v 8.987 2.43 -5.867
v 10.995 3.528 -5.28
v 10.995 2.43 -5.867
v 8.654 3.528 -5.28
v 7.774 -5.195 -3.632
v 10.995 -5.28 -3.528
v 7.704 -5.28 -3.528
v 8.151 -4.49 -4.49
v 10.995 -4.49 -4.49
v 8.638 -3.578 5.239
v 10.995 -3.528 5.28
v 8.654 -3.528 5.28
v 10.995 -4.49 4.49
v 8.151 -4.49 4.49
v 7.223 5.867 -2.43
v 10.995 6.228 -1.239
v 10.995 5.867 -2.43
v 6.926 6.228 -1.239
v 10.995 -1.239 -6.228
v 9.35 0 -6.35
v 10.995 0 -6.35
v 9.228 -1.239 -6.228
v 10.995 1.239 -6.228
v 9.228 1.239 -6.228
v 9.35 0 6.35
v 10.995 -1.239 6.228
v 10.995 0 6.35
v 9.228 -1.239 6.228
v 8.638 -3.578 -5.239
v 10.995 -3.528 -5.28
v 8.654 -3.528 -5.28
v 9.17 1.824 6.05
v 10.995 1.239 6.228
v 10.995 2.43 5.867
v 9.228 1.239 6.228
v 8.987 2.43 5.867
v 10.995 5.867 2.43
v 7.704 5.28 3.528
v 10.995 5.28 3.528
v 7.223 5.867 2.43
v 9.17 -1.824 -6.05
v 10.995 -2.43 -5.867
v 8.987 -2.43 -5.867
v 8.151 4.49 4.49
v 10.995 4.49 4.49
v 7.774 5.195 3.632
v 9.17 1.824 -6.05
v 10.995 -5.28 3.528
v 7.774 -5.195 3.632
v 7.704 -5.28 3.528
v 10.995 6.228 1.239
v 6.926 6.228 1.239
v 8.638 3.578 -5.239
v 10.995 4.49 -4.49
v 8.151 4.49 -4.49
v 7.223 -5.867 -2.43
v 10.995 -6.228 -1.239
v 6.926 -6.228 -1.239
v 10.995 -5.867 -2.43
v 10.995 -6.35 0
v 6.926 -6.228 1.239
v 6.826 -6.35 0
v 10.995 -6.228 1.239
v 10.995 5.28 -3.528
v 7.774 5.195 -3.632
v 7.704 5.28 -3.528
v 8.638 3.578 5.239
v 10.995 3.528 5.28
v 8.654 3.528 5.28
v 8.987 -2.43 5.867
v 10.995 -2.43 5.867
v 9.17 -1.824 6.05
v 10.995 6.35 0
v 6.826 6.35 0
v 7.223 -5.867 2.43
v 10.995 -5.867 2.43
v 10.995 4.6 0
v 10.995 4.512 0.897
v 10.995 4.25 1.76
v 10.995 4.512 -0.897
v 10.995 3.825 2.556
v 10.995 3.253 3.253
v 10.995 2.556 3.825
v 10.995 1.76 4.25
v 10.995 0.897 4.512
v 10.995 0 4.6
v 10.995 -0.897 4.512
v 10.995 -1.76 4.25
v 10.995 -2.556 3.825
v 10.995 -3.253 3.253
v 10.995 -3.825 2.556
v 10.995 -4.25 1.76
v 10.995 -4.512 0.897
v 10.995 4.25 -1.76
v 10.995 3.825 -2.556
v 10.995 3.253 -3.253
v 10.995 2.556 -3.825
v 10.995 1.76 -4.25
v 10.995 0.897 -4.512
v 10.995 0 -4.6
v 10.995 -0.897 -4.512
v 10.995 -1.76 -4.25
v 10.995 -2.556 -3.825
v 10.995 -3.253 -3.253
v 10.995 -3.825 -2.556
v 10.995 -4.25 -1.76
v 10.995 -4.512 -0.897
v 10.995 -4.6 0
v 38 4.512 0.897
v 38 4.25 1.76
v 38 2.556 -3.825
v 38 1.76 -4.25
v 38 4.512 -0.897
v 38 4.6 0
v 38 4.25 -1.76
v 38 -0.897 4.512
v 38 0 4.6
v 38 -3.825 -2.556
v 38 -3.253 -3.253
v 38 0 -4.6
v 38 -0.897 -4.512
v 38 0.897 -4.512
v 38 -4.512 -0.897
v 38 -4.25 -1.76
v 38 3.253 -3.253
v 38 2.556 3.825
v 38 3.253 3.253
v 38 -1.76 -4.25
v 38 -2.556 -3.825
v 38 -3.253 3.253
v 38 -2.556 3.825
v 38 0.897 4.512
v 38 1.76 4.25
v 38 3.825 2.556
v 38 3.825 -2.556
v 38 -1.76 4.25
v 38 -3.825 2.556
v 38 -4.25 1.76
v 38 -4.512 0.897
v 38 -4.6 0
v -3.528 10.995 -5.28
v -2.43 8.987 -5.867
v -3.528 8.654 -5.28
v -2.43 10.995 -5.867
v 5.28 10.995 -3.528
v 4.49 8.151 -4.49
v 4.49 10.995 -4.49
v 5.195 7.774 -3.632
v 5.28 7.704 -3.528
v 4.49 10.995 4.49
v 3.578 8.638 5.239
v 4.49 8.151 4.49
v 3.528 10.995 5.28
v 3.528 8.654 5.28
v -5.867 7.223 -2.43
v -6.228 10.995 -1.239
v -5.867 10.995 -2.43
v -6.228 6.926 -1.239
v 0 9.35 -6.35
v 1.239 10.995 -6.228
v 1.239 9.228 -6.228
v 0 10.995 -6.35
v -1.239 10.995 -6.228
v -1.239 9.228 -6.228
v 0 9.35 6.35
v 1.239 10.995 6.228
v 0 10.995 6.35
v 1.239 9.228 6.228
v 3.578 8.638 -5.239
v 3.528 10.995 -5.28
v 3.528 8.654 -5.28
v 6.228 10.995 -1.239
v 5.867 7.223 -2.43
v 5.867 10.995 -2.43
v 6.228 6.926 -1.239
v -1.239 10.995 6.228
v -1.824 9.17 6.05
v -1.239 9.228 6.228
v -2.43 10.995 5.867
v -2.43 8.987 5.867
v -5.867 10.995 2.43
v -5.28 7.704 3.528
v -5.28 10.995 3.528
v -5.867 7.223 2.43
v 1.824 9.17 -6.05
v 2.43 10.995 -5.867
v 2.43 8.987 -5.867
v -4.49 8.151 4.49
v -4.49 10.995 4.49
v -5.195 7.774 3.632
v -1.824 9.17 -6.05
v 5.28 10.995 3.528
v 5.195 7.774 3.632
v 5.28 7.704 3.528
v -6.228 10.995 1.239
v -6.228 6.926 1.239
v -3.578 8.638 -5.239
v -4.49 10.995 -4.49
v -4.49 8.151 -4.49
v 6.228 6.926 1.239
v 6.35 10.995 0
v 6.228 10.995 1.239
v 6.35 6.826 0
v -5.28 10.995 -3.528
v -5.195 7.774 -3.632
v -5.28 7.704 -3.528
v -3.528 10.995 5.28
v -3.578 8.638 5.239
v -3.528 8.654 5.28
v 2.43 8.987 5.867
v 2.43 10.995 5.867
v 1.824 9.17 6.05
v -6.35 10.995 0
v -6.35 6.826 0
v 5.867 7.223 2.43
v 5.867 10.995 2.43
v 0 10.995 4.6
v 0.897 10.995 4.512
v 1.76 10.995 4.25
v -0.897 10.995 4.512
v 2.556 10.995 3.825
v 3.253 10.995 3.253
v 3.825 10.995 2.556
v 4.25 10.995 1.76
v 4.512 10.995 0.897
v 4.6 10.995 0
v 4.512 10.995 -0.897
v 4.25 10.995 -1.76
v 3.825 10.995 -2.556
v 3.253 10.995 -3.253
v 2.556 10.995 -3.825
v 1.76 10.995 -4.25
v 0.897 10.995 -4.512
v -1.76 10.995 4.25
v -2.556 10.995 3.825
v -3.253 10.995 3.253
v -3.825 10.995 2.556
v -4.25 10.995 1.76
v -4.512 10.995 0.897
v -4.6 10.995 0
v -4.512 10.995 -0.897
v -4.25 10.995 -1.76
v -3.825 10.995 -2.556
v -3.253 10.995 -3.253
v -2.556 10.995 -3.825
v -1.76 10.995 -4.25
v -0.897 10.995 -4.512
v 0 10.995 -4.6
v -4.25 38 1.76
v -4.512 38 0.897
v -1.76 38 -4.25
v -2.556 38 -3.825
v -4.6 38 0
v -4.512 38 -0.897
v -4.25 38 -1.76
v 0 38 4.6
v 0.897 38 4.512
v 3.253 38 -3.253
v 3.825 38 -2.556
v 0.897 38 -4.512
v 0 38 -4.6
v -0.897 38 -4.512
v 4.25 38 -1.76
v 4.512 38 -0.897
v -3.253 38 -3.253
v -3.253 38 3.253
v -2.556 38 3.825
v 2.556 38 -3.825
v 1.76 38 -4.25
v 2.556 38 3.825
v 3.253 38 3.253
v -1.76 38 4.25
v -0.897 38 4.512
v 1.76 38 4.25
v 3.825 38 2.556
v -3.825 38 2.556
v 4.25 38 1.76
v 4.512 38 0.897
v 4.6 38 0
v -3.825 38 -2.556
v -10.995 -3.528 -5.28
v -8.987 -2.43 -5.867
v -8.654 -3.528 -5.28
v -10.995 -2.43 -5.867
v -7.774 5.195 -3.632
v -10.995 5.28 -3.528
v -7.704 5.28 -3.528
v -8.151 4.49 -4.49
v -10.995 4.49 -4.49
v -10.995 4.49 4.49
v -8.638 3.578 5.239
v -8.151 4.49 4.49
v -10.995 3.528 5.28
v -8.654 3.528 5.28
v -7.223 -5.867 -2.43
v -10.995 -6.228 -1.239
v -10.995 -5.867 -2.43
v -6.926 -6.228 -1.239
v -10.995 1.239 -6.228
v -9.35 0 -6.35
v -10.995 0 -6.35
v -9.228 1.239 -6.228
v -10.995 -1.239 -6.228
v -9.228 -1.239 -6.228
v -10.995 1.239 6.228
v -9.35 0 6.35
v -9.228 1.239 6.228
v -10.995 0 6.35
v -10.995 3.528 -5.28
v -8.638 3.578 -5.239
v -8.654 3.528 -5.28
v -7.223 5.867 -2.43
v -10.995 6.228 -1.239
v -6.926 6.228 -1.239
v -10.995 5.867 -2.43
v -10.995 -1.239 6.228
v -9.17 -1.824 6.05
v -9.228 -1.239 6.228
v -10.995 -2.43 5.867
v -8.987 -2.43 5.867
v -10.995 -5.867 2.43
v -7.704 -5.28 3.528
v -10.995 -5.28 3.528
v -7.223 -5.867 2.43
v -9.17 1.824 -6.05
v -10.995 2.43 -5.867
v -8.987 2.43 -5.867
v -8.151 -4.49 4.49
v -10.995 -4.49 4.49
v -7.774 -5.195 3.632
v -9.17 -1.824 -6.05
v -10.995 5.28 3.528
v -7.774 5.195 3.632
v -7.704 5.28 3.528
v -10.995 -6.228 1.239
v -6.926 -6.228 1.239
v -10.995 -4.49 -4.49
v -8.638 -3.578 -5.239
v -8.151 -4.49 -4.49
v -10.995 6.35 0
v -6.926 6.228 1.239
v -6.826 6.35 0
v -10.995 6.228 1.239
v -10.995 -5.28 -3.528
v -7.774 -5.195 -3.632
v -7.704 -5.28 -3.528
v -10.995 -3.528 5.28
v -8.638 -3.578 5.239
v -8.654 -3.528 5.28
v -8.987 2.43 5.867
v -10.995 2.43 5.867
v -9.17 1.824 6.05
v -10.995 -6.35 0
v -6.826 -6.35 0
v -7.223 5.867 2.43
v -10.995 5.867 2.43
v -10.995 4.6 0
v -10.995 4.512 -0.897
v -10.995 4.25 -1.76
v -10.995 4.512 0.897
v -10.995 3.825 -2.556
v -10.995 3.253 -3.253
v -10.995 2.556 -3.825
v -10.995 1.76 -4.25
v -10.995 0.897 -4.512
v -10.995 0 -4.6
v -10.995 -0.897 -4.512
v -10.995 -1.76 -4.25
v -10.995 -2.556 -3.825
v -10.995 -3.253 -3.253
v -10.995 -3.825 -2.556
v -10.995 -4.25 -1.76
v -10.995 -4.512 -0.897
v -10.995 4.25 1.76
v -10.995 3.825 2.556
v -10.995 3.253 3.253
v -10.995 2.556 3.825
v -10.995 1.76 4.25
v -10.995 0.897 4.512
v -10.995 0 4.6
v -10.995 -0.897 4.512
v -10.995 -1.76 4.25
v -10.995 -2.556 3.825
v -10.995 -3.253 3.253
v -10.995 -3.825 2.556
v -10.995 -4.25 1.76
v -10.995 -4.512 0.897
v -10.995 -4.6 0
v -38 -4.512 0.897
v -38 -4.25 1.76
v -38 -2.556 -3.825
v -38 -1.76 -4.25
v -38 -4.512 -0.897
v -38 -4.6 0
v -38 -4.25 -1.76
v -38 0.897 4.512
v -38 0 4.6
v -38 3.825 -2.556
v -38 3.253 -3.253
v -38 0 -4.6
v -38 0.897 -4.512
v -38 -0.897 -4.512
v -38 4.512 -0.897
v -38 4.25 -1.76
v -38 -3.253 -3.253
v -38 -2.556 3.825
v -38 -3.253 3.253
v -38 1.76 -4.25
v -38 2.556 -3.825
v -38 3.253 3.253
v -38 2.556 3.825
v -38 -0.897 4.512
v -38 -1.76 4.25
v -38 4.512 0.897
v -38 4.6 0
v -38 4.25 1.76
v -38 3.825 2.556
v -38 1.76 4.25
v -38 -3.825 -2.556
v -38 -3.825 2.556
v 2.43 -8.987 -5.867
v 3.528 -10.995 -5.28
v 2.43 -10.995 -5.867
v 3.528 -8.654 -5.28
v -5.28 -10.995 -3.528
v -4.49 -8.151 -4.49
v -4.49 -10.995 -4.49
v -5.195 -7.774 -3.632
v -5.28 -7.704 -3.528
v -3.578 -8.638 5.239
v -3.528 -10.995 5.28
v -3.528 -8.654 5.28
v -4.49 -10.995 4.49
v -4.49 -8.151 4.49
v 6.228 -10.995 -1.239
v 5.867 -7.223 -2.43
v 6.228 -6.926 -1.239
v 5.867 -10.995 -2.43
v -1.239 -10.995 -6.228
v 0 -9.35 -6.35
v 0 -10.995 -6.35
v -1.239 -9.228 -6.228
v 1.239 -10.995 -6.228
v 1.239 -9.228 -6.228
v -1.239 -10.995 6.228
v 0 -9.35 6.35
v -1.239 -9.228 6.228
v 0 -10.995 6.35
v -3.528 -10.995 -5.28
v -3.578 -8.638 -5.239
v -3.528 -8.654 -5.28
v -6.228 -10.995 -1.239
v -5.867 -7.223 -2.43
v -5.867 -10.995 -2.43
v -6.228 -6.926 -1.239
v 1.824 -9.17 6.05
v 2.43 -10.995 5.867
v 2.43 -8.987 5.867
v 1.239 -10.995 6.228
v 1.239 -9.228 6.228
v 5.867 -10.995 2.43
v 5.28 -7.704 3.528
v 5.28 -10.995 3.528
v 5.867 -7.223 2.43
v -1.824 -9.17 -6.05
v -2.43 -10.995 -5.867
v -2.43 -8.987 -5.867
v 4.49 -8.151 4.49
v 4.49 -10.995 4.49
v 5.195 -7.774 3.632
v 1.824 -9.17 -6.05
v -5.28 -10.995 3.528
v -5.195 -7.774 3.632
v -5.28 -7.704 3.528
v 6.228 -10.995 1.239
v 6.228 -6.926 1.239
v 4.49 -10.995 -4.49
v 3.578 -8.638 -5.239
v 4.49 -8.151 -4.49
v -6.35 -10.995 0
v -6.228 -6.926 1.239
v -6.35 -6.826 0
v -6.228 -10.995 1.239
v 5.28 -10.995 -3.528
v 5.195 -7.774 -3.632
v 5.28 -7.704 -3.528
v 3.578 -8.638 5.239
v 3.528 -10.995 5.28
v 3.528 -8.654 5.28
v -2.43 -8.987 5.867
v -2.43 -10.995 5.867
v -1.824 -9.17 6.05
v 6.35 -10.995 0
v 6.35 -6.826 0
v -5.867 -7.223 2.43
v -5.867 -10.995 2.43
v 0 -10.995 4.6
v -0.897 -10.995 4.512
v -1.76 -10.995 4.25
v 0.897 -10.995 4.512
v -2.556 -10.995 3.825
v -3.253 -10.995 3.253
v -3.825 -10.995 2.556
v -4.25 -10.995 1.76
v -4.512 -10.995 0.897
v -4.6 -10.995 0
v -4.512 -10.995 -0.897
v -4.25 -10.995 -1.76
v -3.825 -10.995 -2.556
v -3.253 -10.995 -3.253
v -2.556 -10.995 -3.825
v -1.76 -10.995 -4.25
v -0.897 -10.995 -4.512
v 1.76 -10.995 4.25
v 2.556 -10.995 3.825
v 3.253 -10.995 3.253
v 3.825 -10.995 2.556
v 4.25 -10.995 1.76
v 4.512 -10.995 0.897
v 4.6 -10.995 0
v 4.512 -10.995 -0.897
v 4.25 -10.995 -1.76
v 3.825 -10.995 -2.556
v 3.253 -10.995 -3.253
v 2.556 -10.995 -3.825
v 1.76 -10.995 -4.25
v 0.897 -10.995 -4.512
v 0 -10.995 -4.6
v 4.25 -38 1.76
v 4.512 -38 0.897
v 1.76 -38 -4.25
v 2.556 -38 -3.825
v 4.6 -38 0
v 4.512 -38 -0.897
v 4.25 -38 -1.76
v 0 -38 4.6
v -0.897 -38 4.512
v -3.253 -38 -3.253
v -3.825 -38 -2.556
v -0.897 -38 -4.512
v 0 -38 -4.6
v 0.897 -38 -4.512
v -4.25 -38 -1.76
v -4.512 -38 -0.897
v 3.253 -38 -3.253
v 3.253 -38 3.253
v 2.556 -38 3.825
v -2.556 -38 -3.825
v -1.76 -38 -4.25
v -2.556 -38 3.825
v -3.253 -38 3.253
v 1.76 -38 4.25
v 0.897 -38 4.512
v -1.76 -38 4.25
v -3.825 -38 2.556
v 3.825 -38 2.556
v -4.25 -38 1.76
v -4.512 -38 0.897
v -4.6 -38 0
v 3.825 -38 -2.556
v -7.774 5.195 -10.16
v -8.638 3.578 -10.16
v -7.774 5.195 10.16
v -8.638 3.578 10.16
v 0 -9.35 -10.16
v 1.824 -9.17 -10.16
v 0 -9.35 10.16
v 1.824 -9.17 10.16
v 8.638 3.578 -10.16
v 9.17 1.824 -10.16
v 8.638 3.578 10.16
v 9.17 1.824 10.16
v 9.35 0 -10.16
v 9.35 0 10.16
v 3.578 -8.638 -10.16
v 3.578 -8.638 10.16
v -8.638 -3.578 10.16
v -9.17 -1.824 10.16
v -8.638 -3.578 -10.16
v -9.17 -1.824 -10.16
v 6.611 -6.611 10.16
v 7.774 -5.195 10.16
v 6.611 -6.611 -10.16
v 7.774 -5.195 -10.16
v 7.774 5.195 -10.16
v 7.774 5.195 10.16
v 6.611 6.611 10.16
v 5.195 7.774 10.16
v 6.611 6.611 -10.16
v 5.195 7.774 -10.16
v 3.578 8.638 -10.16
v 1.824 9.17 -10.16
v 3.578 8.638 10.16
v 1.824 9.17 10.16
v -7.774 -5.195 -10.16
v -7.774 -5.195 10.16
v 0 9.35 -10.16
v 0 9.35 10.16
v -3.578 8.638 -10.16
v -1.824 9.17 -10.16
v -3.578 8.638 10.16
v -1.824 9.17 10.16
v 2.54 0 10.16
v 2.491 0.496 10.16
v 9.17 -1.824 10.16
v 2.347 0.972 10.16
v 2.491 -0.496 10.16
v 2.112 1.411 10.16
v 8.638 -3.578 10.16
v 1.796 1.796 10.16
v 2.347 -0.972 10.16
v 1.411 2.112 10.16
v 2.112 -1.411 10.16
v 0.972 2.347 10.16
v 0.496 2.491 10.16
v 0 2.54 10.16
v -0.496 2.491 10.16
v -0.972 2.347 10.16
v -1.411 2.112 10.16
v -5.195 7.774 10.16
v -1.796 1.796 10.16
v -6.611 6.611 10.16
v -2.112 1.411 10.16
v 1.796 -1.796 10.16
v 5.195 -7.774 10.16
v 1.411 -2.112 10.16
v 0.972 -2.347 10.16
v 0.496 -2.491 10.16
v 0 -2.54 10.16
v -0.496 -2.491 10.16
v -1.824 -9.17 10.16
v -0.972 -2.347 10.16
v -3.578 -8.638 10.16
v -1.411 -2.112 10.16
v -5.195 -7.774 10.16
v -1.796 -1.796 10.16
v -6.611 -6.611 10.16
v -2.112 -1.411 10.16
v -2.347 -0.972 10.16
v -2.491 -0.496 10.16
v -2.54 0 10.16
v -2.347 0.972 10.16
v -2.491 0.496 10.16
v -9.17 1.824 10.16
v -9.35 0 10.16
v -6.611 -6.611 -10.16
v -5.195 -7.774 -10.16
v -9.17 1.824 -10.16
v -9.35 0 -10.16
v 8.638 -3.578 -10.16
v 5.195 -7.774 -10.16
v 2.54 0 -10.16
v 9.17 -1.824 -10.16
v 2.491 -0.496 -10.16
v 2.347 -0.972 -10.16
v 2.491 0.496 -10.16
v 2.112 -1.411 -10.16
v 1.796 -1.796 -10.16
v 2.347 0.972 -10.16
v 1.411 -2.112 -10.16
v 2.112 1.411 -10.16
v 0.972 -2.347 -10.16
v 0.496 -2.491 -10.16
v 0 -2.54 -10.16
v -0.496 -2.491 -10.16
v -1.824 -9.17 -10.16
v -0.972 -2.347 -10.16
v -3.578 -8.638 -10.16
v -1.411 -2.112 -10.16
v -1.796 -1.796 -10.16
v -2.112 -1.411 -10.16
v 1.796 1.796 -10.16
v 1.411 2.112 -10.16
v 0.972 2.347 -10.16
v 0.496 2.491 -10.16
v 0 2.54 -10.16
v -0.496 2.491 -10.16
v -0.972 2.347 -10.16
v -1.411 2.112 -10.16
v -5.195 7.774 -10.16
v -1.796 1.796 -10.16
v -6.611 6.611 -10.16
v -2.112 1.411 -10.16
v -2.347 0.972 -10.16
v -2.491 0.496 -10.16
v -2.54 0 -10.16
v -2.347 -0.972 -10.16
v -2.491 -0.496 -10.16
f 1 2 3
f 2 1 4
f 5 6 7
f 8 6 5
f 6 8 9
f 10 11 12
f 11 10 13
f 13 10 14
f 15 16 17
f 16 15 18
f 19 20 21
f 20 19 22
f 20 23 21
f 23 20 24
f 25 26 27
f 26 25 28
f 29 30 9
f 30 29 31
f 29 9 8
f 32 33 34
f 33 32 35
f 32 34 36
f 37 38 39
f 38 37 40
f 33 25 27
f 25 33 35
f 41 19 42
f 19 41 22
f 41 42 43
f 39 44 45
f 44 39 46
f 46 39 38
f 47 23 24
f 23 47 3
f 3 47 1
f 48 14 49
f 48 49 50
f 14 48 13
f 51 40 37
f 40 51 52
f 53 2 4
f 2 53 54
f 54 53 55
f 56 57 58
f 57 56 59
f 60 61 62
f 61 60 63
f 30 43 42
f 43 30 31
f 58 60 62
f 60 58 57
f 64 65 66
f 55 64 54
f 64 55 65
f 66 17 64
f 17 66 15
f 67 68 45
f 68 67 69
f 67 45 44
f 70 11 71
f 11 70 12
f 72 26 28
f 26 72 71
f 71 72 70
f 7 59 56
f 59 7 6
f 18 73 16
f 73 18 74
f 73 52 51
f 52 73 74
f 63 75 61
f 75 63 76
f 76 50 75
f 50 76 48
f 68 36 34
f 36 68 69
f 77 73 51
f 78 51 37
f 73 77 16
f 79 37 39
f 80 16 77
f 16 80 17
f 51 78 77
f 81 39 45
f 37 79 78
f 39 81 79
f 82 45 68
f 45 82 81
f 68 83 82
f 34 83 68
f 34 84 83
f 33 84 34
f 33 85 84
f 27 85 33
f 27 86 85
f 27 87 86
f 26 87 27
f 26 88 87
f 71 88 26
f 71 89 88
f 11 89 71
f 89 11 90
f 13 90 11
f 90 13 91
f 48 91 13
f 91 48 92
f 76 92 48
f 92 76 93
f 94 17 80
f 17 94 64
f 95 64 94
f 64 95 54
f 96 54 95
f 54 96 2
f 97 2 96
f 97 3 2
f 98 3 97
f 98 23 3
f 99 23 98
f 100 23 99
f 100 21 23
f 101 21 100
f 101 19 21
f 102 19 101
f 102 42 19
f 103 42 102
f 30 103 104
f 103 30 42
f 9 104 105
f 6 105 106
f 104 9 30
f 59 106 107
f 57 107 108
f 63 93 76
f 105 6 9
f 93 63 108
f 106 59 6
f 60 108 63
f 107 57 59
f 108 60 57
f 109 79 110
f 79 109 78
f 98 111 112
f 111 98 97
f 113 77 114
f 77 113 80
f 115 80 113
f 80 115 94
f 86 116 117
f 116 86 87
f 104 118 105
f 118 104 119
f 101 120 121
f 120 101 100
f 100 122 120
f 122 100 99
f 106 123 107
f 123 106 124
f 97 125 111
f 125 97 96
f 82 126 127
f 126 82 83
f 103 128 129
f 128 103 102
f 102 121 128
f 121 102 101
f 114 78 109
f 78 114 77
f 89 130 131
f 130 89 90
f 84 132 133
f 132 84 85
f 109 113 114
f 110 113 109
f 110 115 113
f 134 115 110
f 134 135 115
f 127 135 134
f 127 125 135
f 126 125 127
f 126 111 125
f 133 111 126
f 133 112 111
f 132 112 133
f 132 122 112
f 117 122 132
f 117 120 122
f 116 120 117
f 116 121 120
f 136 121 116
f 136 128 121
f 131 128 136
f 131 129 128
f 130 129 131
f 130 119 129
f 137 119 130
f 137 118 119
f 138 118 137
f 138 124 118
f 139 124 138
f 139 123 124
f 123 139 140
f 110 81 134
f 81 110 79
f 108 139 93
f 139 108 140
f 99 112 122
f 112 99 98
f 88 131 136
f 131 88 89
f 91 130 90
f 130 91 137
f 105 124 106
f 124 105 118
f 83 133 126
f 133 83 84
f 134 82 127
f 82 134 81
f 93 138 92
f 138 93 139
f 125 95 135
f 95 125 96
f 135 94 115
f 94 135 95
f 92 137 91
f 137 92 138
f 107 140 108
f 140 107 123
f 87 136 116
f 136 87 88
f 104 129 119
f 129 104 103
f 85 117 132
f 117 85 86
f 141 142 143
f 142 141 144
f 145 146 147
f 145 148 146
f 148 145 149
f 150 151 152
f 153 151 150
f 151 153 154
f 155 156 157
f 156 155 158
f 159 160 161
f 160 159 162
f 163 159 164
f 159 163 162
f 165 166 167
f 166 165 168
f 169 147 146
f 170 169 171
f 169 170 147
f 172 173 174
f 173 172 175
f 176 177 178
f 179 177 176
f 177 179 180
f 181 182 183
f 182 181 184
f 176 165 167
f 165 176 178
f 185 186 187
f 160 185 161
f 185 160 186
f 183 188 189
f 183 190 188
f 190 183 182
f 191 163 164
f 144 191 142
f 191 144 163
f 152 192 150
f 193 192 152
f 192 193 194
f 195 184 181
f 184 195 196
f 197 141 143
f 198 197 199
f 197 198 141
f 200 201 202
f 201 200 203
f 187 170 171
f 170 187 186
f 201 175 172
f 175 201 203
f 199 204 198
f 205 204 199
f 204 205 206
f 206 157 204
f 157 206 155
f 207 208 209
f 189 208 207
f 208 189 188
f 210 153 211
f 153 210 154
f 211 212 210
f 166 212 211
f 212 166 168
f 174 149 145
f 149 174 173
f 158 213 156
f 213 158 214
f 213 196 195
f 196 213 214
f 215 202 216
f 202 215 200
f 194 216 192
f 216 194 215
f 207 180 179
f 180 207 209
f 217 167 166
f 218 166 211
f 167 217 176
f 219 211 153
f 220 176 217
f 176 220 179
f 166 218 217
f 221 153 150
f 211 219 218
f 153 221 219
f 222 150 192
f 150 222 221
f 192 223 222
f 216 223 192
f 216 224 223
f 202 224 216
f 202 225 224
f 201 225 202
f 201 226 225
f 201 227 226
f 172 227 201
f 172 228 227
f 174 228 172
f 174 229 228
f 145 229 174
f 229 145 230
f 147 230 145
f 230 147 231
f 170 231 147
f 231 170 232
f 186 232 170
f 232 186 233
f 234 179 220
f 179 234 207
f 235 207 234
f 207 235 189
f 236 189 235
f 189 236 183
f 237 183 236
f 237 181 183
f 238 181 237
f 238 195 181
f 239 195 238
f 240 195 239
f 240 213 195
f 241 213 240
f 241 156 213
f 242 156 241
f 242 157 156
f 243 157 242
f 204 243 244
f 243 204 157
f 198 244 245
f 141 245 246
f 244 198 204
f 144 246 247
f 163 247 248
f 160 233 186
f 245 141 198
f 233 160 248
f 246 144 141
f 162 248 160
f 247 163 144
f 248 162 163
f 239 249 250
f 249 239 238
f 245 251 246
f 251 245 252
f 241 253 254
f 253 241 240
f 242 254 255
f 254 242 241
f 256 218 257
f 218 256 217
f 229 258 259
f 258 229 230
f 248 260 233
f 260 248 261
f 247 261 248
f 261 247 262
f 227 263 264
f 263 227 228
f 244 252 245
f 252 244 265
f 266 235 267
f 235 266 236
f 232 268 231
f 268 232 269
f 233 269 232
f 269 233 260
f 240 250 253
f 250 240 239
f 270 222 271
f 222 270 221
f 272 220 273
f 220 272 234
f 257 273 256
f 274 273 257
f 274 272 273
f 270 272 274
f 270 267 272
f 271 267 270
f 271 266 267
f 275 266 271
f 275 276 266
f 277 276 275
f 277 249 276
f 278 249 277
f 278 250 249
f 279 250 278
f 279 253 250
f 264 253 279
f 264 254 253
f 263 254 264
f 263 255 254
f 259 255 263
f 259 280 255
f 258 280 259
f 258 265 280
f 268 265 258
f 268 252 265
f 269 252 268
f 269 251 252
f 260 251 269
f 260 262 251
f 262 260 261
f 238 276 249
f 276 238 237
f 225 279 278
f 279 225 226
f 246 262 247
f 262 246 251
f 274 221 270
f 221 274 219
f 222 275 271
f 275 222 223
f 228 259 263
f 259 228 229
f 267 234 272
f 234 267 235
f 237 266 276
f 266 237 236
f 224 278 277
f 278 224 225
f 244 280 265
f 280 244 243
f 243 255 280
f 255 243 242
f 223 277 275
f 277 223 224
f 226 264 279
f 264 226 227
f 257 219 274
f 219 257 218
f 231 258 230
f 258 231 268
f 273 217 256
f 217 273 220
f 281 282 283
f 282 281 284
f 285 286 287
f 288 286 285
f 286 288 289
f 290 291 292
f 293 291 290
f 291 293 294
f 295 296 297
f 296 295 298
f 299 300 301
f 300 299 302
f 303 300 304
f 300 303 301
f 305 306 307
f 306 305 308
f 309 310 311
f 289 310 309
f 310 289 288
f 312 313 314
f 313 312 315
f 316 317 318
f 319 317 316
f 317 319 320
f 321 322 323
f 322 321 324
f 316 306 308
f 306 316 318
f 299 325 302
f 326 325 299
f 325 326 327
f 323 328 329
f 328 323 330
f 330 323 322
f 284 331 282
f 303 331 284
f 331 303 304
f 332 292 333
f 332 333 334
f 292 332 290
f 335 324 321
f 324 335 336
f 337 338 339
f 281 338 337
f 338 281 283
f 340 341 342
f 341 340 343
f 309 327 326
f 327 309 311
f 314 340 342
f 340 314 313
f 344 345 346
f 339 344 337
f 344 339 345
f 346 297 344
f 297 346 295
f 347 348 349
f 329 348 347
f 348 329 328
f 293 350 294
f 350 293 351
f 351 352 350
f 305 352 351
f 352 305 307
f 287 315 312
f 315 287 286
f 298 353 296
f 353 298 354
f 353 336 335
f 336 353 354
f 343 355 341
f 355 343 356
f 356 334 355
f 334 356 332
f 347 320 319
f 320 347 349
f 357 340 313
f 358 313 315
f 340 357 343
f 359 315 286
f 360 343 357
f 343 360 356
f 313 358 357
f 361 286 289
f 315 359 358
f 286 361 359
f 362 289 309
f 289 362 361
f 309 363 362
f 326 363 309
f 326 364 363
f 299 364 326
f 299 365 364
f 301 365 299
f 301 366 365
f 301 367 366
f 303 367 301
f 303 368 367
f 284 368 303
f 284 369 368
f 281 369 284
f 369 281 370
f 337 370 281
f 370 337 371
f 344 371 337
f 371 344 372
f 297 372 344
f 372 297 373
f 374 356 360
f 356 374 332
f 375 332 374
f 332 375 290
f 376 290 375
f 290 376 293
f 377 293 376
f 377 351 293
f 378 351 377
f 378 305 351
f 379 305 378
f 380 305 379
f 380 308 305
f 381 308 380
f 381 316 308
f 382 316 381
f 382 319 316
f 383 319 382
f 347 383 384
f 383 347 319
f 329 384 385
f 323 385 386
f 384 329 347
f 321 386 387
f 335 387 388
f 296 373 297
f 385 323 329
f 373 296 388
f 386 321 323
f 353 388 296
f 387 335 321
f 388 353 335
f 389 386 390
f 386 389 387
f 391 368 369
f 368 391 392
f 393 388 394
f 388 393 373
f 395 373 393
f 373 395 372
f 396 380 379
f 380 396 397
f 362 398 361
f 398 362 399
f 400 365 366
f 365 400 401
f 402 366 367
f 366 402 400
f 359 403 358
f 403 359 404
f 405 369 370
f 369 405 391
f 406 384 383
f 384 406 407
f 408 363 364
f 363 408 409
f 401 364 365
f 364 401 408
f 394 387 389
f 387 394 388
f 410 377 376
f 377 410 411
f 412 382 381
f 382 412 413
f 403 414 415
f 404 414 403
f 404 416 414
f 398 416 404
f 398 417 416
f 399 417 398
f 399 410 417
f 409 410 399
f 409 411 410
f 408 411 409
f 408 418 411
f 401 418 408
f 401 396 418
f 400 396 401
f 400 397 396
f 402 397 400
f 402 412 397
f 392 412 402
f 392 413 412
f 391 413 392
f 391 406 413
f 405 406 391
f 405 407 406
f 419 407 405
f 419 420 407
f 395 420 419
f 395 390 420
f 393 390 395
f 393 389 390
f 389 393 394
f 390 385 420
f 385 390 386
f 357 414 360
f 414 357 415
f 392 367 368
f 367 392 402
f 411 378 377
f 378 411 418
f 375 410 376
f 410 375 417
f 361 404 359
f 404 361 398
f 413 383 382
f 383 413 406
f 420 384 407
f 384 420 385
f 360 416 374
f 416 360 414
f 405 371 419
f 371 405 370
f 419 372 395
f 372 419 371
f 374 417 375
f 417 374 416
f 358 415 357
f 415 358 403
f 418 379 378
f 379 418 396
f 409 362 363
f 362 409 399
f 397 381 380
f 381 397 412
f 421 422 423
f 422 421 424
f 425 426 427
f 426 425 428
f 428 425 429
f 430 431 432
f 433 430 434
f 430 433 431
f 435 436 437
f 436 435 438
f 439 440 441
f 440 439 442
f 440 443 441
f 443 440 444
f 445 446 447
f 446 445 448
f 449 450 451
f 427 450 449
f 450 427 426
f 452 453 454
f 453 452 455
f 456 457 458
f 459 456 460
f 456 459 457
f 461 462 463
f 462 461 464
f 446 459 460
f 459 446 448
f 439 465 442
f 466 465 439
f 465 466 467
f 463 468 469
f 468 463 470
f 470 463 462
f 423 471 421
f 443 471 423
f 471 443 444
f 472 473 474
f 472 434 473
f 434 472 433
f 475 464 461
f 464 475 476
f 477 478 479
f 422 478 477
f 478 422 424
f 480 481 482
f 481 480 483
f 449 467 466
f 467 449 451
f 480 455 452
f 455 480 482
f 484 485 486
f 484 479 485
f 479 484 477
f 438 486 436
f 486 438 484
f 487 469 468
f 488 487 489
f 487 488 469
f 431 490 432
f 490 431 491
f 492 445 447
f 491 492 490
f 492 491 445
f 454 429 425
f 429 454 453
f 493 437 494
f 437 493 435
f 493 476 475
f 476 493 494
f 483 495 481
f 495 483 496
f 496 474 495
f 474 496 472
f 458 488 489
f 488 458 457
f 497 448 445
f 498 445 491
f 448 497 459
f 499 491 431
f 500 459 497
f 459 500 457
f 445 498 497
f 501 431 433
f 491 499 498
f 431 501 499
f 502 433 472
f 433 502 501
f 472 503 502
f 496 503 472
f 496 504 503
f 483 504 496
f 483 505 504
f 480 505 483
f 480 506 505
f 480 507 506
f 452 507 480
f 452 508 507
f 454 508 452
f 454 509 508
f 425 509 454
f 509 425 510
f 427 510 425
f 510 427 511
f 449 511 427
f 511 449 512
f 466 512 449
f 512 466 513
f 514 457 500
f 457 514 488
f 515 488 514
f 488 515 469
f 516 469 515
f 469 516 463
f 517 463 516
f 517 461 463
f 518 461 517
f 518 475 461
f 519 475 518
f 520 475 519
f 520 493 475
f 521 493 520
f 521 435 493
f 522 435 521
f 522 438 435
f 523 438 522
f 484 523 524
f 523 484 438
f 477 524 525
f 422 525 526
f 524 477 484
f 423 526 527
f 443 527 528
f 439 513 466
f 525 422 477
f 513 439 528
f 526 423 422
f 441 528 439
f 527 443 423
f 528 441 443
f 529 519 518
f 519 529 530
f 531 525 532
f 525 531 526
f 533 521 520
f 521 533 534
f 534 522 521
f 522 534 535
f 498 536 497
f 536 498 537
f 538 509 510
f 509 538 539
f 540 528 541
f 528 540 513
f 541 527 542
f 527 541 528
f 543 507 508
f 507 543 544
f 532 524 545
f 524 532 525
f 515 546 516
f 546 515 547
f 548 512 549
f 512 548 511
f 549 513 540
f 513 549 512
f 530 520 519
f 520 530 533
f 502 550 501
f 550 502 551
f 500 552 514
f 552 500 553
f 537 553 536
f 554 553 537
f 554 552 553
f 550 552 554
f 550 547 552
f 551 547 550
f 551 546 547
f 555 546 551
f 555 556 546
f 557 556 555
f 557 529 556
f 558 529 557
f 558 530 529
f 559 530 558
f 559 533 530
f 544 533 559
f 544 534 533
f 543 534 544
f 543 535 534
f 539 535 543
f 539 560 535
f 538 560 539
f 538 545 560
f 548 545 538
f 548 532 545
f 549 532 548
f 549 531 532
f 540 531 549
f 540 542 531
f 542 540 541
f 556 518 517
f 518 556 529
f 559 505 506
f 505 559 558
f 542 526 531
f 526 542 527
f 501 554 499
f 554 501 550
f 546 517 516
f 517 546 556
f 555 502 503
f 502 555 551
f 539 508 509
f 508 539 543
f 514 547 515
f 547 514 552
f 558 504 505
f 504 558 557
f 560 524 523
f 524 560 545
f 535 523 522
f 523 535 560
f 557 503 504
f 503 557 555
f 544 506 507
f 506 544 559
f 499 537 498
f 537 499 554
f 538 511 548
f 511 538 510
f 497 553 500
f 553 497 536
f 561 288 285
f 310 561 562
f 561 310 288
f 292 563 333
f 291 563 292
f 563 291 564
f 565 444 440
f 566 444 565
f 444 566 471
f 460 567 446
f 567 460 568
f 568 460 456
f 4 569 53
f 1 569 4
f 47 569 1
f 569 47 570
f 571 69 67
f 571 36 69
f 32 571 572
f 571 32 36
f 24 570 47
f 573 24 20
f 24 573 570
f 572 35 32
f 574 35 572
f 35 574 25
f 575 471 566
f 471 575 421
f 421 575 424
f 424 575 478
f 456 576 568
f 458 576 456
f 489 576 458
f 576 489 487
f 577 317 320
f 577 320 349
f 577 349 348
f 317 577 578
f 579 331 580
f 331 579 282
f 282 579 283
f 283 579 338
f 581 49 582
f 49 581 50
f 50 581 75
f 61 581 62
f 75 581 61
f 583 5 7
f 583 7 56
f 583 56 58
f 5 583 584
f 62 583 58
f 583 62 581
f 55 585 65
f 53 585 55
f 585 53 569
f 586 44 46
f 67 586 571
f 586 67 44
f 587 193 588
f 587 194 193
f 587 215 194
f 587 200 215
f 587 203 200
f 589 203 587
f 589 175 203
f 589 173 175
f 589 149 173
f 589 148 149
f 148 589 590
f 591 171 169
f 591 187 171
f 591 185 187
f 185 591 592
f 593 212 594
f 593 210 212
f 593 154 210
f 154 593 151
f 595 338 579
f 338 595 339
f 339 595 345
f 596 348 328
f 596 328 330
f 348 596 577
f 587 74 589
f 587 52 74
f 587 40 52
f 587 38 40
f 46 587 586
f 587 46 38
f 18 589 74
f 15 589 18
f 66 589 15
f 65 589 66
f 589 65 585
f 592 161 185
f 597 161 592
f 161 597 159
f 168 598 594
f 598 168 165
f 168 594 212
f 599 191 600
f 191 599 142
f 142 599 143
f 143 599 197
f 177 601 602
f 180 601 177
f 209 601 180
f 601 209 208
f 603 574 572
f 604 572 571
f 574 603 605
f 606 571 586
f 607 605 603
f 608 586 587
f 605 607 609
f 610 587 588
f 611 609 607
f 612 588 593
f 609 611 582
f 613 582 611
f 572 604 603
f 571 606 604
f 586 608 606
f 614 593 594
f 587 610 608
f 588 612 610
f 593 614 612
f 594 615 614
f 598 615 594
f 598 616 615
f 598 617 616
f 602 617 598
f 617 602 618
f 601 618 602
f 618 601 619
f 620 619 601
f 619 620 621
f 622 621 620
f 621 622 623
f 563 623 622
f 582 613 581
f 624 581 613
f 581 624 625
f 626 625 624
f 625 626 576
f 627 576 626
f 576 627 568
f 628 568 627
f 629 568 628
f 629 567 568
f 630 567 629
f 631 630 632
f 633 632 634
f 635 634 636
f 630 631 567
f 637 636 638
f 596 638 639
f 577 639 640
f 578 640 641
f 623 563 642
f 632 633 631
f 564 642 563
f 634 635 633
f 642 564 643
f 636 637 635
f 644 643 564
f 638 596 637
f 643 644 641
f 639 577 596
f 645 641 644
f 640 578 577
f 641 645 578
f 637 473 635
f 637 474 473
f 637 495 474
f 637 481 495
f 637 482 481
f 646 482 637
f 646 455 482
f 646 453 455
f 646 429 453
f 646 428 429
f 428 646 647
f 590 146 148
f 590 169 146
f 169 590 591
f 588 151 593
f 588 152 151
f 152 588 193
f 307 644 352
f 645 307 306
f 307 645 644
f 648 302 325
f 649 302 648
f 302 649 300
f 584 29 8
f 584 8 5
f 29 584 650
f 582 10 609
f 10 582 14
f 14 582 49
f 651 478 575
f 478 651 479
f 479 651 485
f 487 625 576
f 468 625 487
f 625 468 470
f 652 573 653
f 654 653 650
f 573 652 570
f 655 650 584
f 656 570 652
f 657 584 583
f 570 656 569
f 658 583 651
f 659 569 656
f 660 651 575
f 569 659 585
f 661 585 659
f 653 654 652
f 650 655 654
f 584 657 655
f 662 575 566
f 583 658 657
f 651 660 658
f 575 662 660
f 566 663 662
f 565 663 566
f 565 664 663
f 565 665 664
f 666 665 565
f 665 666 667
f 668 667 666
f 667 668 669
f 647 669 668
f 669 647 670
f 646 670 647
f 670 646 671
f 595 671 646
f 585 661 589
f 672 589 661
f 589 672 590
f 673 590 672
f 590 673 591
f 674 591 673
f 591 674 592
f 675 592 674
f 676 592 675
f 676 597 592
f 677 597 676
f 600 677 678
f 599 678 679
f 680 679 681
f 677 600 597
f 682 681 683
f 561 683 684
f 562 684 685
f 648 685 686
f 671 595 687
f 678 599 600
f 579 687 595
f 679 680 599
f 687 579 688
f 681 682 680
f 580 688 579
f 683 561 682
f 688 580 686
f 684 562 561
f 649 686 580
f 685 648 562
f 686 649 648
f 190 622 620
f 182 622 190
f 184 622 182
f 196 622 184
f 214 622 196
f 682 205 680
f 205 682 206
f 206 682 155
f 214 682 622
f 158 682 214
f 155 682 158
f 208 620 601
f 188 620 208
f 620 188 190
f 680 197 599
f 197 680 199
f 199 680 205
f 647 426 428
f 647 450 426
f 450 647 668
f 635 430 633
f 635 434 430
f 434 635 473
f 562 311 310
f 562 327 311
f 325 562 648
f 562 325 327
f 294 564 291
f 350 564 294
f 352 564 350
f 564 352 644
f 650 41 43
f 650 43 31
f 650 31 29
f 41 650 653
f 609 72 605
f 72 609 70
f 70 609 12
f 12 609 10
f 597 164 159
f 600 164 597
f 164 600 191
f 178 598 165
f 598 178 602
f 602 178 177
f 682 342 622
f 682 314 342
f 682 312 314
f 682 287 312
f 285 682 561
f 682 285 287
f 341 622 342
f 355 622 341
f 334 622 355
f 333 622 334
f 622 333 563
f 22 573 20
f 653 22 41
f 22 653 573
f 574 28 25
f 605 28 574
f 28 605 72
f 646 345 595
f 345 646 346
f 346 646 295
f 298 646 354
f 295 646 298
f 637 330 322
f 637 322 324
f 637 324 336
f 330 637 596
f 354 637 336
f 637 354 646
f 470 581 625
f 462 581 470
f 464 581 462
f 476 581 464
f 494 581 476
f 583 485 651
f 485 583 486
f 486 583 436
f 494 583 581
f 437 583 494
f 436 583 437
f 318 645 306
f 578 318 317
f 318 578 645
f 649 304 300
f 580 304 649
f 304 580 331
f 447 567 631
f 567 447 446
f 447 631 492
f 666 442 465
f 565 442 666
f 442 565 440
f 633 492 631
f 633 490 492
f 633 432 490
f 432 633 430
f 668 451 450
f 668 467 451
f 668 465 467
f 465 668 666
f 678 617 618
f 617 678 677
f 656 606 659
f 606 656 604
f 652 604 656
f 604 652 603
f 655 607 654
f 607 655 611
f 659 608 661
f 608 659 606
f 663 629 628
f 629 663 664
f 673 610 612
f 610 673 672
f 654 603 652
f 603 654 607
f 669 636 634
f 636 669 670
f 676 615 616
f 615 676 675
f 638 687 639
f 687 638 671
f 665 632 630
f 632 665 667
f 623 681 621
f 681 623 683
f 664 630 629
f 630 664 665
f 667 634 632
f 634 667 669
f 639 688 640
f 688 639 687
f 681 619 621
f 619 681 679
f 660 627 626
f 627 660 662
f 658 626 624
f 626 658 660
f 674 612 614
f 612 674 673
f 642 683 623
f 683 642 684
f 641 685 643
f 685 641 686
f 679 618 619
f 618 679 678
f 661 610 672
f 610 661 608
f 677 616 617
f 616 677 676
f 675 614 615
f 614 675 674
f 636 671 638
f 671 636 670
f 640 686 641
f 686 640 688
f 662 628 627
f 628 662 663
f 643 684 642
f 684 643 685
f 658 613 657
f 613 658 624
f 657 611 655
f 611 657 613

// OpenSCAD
$fn = 32;

// ----------------------------------------------------------------------
// Cardan cross: 76 mm span, 12.7 mm trunnions
// ----------------------------------------------------------------------

// --- parameters (mm) ---
journal_d = 12.7;         // trunnion diameter
arm_len = 38;             // trunnion length from the centre
step_r = 4.32;            // step position from the centre
step_d = 9.2;             // journal diameter after the step
hub_d = 18.7;             // hub diameter
hub_h = 20.32;            // hub height
bore_d = 5.08;            // hub bore

difference() {
  union() {
    /* hub along the joint axis */
    cylinder(h = hub_h, d = hub_d, center = true);
    for (a = [0 : 90 : 270]) rotate([0, 0, a]) {
      /* trunnion, sunk into the hub */
      translate([hub_d / 4, 0, 0]) rotate([0, 90, 0]) cylinder(h = step_r + 2, d = journal_d);
      /* stepped journal out to the tip */
      translate([step_r - 0.5, 0, 0]) rotate([0, 90, 0]) cylinder(h = arm_len + 0.5 - step_r, d = step_d);
    }
  }
  /* lubrication bore through the hub, 2.5 mm clear on both sides */
  translate([0, 0, -hub_h / 2 - 2.5]) cylinder(h = hub_h + 5, d = bore_d);
}
